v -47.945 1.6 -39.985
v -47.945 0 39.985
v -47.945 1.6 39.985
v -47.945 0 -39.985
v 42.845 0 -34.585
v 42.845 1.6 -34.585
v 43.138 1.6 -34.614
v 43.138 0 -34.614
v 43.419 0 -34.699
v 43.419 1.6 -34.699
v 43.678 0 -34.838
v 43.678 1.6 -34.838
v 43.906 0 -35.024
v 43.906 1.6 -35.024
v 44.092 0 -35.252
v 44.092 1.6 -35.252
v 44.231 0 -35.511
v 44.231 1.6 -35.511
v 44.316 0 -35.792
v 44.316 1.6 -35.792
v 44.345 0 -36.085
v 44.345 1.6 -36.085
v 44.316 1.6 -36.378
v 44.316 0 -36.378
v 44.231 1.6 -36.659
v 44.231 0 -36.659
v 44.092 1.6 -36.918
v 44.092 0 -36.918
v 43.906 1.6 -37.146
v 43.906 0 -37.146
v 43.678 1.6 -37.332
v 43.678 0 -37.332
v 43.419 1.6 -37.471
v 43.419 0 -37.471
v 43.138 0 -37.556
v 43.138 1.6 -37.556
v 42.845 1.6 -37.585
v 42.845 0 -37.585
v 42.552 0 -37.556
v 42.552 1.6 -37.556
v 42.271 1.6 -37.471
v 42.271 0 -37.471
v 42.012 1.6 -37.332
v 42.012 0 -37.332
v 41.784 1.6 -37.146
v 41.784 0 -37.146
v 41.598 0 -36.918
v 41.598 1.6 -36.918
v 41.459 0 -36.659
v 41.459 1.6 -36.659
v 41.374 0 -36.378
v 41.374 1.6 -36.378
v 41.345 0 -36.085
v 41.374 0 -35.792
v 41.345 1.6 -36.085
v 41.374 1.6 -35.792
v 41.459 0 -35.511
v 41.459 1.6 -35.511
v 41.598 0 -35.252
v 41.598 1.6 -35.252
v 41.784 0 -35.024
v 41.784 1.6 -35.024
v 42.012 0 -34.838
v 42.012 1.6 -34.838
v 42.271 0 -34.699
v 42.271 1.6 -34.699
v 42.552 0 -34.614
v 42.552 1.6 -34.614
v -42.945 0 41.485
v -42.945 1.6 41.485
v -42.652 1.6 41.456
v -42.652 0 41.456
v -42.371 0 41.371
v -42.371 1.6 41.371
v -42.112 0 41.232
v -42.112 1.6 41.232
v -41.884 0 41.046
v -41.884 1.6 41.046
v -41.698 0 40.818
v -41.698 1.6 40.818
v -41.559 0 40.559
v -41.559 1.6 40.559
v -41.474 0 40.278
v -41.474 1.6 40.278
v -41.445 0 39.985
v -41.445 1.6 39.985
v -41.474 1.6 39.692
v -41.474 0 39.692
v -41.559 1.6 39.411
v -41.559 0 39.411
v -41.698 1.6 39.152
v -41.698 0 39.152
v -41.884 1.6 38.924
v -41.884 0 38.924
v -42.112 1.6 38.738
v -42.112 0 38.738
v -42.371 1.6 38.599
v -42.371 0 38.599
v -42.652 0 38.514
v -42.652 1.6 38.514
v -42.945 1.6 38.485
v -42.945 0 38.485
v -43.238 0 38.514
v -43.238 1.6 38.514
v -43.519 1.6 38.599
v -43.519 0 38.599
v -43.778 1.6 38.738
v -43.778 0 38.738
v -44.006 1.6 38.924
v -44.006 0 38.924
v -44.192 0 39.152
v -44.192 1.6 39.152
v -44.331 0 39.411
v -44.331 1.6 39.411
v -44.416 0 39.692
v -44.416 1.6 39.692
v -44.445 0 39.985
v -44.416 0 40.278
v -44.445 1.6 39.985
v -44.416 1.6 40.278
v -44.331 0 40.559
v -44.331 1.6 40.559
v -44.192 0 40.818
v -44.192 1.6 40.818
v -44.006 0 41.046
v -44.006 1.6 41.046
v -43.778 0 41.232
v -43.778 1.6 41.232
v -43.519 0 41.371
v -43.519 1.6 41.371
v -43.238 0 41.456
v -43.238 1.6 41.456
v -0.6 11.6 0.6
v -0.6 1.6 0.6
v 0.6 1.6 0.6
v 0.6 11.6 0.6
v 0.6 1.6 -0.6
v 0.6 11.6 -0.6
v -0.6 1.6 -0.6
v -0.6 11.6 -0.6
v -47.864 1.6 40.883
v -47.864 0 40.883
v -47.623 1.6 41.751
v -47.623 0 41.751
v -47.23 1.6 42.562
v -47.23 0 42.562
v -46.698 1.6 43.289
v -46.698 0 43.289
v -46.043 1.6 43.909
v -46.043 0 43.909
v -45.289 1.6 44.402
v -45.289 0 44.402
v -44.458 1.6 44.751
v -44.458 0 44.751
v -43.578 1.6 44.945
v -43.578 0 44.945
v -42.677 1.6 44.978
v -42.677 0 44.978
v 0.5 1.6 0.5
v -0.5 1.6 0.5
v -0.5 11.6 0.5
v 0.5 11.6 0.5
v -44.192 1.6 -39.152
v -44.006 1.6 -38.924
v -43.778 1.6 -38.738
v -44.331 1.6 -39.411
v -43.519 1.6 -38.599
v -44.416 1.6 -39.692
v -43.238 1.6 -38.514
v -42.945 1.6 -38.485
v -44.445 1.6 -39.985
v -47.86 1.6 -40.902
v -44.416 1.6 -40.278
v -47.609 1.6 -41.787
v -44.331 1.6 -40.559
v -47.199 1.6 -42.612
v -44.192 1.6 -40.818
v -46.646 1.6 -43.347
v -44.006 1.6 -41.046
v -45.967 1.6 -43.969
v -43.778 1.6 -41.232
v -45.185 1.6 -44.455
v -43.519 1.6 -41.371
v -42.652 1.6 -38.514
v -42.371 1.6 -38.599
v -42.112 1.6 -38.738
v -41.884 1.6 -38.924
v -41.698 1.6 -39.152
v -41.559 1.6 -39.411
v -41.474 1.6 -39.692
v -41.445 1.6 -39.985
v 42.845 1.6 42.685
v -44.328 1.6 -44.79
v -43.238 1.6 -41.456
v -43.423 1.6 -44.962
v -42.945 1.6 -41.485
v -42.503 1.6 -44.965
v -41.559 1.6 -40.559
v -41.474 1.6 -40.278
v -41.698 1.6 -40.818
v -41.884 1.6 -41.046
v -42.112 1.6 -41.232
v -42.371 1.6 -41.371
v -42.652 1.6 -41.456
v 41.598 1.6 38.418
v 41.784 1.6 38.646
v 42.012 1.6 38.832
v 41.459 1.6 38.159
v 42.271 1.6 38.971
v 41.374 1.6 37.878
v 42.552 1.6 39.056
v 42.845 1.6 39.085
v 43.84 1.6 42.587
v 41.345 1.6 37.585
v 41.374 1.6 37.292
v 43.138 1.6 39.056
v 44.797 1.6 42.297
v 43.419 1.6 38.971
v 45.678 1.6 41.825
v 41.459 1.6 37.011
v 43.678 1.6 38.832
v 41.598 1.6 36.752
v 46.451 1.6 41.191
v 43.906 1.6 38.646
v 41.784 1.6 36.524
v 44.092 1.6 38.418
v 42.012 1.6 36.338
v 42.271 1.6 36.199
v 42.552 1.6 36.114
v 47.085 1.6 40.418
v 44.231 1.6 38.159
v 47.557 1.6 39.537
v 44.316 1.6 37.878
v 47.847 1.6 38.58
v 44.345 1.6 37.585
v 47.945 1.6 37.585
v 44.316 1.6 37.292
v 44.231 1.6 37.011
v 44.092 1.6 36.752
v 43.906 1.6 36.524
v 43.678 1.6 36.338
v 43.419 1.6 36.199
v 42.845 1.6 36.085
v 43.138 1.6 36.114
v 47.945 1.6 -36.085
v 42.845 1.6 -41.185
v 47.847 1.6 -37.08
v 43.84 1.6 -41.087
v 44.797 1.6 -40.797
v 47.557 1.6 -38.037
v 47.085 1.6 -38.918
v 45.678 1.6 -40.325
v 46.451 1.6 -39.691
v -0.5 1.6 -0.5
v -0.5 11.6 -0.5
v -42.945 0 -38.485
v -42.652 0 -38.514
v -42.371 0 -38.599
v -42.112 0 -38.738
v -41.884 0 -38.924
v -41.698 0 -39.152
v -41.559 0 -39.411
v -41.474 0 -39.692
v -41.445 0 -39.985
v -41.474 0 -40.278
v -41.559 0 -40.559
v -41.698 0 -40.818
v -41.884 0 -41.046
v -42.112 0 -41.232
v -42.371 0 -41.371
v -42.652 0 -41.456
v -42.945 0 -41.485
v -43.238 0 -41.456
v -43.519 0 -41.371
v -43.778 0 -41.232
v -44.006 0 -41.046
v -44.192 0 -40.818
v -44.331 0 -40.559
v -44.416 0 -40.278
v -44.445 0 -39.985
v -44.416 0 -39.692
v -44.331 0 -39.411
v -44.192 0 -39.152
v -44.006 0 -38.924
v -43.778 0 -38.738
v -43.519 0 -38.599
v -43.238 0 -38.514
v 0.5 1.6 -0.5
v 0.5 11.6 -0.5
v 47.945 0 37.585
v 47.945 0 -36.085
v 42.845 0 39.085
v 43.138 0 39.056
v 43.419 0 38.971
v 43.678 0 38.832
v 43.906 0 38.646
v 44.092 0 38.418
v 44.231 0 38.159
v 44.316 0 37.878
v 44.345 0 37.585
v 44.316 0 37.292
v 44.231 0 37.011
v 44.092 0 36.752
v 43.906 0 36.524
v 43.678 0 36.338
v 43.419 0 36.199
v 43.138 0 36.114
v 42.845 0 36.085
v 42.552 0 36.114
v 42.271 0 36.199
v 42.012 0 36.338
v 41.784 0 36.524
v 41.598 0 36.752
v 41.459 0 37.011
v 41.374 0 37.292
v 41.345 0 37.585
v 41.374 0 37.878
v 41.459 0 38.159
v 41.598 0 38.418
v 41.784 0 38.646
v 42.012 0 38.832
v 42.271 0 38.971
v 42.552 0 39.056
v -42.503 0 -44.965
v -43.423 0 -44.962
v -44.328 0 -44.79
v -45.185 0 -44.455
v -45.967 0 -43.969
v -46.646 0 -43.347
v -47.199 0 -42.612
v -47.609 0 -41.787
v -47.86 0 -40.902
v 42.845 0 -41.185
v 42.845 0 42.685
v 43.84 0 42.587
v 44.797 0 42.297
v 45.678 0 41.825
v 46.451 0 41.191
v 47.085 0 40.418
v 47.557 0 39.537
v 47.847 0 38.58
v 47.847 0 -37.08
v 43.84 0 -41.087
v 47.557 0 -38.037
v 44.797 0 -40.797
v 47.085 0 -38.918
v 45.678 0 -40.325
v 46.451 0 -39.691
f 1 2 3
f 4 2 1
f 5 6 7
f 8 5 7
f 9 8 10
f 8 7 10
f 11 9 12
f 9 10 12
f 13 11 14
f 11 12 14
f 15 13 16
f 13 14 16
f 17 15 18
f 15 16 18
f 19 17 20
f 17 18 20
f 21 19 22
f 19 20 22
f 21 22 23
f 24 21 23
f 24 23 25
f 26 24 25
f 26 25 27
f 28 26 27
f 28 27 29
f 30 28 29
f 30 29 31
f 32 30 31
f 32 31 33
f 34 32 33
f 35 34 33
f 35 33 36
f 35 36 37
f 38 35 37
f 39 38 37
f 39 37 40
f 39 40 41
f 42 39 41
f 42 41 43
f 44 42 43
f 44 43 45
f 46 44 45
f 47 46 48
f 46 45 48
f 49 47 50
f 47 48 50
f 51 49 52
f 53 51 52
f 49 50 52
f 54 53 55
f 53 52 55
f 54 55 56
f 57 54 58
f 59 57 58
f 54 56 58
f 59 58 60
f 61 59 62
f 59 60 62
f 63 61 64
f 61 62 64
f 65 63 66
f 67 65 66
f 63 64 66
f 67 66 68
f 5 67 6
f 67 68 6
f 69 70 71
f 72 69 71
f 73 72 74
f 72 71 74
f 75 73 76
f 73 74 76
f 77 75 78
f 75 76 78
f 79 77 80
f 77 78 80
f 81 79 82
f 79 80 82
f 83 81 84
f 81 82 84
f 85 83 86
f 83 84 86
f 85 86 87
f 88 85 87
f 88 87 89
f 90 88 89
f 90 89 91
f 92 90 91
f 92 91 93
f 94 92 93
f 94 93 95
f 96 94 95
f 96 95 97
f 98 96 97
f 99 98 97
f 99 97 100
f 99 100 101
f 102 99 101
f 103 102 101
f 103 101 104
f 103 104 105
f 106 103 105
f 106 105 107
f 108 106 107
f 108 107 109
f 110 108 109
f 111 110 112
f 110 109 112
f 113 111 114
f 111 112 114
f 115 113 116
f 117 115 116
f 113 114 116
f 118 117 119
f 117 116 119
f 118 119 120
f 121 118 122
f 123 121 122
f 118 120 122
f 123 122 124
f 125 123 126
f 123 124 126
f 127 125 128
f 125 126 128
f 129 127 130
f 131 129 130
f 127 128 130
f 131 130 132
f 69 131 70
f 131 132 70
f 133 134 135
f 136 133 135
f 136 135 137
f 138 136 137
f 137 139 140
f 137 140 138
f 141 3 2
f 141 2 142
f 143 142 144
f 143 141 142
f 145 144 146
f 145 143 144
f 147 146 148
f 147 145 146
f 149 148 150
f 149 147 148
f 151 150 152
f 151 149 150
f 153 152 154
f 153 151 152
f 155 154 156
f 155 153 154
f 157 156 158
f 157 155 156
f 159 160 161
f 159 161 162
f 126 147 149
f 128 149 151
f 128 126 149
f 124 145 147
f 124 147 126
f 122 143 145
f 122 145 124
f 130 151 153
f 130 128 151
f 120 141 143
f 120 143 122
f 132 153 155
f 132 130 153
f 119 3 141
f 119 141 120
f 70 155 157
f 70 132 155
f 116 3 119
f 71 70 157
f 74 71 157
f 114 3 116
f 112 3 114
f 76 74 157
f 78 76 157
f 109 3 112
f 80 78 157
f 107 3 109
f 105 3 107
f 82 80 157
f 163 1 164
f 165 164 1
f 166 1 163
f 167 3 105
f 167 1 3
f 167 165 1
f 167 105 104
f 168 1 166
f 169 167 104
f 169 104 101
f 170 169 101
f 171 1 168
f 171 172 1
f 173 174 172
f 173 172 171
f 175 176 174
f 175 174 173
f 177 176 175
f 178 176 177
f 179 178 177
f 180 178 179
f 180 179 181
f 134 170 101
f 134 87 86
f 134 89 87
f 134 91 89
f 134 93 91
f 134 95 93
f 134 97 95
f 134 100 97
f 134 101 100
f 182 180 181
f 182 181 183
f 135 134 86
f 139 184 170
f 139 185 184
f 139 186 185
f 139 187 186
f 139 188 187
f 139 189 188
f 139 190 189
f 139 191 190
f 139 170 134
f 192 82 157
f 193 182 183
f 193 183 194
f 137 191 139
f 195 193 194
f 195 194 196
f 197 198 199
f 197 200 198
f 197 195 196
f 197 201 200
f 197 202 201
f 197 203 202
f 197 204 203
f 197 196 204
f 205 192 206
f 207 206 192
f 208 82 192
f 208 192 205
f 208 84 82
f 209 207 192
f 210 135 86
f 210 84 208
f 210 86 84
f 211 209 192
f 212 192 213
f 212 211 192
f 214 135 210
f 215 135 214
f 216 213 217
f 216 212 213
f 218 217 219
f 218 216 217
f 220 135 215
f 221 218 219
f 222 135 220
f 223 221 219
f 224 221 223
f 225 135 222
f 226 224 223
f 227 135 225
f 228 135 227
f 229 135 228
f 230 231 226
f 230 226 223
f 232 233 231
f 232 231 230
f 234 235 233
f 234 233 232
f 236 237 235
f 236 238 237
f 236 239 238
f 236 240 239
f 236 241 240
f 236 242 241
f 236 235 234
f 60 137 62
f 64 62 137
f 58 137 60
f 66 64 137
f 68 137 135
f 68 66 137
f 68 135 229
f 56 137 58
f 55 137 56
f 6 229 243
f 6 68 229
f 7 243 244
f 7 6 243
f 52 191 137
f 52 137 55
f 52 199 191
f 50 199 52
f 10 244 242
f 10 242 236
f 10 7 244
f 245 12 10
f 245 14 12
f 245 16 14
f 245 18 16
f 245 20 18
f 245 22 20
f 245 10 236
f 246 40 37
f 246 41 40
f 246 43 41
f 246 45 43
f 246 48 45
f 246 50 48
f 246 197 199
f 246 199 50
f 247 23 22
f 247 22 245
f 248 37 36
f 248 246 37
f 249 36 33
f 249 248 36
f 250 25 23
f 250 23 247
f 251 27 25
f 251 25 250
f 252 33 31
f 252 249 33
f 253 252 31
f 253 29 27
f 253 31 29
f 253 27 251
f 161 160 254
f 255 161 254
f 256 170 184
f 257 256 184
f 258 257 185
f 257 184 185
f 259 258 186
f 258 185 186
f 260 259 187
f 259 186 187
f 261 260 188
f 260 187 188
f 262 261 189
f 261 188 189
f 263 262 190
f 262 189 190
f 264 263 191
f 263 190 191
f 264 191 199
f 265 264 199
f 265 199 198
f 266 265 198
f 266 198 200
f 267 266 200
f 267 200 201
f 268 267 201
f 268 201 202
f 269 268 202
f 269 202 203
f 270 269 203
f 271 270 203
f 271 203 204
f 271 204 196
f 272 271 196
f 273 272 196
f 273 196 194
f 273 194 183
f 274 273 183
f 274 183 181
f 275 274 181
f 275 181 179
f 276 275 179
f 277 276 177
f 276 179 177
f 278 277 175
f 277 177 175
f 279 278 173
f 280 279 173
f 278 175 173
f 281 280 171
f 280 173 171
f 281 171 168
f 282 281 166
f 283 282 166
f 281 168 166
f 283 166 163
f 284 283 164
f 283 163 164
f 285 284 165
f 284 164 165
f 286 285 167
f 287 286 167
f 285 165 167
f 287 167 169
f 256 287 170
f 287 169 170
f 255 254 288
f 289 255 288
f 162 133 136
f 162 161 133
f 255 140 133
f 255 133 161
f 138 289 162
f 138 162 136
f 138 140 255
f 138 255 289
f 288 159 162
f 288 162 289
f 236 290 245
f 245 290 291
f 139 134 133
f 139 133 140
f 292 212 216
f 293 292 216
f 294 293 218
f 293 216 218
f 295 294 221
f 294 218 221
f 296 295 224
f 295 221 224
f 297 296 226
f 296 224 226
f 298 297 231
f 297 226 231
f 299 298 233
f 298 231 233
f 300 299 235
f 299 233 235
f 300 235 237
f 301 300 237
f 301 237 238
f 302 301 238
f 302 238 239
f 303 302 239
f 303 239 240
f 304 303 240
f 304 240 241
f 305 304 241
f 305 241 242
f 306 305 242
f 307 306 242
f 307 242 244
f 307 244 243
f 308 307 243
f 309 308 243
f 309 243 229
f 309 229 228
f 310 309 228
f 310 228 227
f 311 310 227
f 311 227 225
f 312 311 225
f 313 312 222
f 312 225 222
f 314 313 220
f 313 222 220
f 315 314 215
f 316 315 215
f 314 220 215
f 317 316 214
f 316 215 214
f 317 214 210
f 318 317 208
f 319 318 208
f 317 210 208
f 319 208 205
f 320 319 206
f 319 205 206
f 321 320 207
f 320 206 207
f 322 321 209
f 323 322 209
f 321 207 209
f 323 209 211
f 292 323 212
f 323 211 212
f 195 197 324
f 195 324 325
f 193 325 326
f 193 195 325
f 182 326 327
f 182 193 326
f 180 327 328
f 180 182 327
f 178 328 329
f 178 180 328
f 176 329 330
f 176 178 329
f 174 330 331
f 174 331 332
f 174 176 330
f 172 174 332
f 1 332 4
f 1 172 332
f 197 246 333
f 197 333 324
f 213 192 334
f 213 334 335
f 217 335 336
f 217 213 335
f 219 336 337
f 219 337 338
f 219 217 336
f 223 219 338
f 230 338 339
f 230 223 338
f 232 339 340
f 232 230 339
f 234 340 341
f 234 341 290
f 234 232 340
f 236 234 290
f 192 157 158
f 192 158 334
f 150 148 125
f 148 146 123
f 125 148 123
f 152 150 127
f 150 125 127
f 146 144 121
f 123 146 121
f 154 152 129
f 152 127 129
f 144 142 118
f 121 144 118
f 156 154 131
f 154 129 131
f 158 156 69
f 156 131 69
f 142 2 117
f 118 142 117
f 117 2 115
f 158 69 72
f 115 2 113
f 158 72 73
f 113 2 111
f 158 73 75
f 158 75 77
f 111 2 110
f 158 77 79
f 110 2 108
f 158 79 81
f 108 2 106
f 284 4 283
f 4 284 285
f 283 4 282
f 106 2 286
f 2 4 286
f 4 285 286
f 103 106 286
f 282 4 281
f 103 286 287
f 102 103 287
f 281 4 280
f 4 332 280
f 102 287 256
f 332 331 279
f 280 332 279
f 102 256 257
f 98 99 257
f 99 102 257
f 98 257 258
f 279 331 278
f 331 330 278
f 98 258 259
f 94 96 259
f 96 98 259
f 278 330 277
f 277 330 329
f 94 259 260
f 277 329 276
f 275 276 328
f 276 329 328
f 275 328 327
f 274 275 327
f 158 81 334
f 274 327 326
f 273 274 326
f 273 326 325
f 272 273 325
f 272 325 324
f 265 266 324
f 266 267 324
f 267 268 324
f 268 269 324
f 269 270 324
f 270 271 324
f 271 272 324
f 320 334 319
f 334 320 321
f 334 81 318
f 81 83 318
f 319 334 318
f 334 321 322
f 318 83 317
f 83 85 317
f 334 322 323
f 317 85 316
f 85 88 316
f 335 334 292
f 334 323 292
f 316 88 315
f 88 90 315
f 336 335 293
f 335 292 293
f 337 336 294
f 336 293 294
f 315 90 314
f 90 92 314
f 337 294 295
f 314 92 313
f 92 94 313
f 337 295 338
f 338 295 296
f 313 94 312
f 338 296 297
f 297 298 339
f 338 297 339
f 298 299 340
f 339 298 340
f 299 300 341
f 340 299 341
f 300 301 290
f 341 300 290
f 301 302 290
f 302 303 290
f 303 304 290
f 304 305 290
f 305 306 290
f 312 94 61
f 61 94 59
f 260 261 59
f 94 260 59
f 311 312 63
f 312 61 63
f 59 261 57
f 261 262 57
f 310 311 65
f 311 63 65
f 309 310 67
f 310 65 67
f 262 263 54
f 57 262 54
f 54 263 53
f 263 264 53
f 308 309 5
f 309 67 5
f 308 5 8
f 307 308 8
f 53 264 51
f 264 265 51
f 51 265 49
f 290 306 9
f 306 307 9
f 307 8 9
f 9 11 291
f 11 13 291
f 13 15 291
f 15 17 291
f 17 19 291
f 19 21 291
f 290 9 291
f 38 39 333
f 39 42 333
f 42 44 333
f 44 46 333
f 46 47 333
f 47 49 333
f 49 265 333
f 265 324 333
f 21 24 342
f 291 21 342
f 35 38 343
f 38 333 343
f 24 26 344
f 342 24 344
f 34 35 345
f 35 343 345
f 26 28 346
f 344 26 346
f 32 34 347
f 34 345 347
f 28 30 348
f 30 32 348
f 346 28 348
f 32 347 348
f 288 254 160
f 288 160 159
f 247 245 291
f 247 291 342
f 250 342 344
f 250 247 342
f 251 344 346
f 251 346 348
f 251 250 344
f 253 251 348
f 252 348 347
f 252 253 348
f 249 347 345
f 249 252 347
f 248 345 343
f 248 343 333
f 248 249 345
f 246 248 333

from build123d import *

# Parameters (mm, degrees)
SKETCH1_W              = 95.89
SKETCH1_H              = 90.17
SUBSTRATE_DEPTH        = 1.6
SKETCH2_R              = 1.5
CUT_EXTRUDE2_DEPTH     = 10
SKETCH3_W              = 1.2
SKETCH3_H              = 1.2
SKETCH3_W_2            = 1
SKETCH3_H_2            = 1
CENTRE_ALIGNMENT_DEPTH = 10
SKETCH4_OUTSIDE_W      = 124.318
SKETCH4_OUTSIDE_H      = 118.598
CUT_EXTRUDE3_DEPTH     = 10


with BuildPart() as part:
    # Sketch1 → Substrate (new body)
    with BuildSketch(Plane(origin=(0, 0, 0), x_dir=(1, 0, 0), z_dir=(0, 1, 0))):
        Rectangle(SKETCH1_W, SKETCH1_H)
    extrude(amount=SUBSTRATE_DEPTH)

    # Sketch2 → Cut-Extrude2 (cut)
    with BuildSketch(Plane(origin=(0, 1.6, 0), x_dir=(1, 0, 0), z_dir=(0, 1, 0))):
        with Locations(Location((42.845, 36.085, 0), (0, 0, 270))):
            Circle(SKETCH2_R)
        with Locations(Location((42.845, -37.585, 0), (0, 0, 270))):
            Circle(SKETCH2_R)
        with Locations(Location((-42.945, -39.985, 0), (0, 0, 270))):
            Circle(SKETCH2_R)
        with Locations(Location((-42.945, 39.985, 0), (0, 0, 270))):
            Circle(SKETCH2_R)
    extrude(amount=-CUT_EXTRUDE2_DEPTH, mode=Mode.SUBTRACT)

    # Sketch3 → Centre Alignment (add)
    with BuildSketch(Plane(origin=(0, 1.6, 0), x_dir=(1, 0, 0), z_dir=(0, 1, 0))):
        Rectangle(SKETCH3_W, SKETCH3_H)
        Rectangle(SKETCH3_W_2, SKETCH3_H_2, mode=Mode.SUBTRACT)
    extrude(amount=CENTRE_ALIGNMENT_DEPTH)

    # Sketch4 outside → Cut-Extrude3 (cut)
    with BuildSketch(Plane(origin=(0, 1.6, 0), x_dir=(1, 0, 0), z_dir=(0, 1, 0))):
        Rectangle(SKETCH4_OUTSIDE_W, SKETCH4_OUTSIDE_H)
        with BuildLine():
            Line((-42.677096043, -44.977817588), (42.845, -42.685))
            ThreePointArc((42.845, -42.685), (46.451244584, -41.191244584), (47.945, -37.585))
            Line((47.945, -37.585), (47.945, 36.085))
            ThreePointArc((47.945, 36.085), (46.451244584, 39.691244584), (42.845, 41.185))
            Line((42.845, 41.185), (-42.502925272, 44.965418651))
            ThreePointArc((-42.502925272, 44.965418651), (-46.320620414, 43.673520953), (-47.945, 39.985))
            Line((-47.945, 39.985), (-47.945, -39.985))
            ThreePointArc((-47.945, -39.985), (-46.384511609, -43.614016381), (-42.677096043, -44.977817588))
        make_face(mode=Mode.SUBTRACT)
    extrude(amount=-CUT_EXTRUDE3_DEPTH, mode=Mode.SUBTRACT)


solid = part.part
